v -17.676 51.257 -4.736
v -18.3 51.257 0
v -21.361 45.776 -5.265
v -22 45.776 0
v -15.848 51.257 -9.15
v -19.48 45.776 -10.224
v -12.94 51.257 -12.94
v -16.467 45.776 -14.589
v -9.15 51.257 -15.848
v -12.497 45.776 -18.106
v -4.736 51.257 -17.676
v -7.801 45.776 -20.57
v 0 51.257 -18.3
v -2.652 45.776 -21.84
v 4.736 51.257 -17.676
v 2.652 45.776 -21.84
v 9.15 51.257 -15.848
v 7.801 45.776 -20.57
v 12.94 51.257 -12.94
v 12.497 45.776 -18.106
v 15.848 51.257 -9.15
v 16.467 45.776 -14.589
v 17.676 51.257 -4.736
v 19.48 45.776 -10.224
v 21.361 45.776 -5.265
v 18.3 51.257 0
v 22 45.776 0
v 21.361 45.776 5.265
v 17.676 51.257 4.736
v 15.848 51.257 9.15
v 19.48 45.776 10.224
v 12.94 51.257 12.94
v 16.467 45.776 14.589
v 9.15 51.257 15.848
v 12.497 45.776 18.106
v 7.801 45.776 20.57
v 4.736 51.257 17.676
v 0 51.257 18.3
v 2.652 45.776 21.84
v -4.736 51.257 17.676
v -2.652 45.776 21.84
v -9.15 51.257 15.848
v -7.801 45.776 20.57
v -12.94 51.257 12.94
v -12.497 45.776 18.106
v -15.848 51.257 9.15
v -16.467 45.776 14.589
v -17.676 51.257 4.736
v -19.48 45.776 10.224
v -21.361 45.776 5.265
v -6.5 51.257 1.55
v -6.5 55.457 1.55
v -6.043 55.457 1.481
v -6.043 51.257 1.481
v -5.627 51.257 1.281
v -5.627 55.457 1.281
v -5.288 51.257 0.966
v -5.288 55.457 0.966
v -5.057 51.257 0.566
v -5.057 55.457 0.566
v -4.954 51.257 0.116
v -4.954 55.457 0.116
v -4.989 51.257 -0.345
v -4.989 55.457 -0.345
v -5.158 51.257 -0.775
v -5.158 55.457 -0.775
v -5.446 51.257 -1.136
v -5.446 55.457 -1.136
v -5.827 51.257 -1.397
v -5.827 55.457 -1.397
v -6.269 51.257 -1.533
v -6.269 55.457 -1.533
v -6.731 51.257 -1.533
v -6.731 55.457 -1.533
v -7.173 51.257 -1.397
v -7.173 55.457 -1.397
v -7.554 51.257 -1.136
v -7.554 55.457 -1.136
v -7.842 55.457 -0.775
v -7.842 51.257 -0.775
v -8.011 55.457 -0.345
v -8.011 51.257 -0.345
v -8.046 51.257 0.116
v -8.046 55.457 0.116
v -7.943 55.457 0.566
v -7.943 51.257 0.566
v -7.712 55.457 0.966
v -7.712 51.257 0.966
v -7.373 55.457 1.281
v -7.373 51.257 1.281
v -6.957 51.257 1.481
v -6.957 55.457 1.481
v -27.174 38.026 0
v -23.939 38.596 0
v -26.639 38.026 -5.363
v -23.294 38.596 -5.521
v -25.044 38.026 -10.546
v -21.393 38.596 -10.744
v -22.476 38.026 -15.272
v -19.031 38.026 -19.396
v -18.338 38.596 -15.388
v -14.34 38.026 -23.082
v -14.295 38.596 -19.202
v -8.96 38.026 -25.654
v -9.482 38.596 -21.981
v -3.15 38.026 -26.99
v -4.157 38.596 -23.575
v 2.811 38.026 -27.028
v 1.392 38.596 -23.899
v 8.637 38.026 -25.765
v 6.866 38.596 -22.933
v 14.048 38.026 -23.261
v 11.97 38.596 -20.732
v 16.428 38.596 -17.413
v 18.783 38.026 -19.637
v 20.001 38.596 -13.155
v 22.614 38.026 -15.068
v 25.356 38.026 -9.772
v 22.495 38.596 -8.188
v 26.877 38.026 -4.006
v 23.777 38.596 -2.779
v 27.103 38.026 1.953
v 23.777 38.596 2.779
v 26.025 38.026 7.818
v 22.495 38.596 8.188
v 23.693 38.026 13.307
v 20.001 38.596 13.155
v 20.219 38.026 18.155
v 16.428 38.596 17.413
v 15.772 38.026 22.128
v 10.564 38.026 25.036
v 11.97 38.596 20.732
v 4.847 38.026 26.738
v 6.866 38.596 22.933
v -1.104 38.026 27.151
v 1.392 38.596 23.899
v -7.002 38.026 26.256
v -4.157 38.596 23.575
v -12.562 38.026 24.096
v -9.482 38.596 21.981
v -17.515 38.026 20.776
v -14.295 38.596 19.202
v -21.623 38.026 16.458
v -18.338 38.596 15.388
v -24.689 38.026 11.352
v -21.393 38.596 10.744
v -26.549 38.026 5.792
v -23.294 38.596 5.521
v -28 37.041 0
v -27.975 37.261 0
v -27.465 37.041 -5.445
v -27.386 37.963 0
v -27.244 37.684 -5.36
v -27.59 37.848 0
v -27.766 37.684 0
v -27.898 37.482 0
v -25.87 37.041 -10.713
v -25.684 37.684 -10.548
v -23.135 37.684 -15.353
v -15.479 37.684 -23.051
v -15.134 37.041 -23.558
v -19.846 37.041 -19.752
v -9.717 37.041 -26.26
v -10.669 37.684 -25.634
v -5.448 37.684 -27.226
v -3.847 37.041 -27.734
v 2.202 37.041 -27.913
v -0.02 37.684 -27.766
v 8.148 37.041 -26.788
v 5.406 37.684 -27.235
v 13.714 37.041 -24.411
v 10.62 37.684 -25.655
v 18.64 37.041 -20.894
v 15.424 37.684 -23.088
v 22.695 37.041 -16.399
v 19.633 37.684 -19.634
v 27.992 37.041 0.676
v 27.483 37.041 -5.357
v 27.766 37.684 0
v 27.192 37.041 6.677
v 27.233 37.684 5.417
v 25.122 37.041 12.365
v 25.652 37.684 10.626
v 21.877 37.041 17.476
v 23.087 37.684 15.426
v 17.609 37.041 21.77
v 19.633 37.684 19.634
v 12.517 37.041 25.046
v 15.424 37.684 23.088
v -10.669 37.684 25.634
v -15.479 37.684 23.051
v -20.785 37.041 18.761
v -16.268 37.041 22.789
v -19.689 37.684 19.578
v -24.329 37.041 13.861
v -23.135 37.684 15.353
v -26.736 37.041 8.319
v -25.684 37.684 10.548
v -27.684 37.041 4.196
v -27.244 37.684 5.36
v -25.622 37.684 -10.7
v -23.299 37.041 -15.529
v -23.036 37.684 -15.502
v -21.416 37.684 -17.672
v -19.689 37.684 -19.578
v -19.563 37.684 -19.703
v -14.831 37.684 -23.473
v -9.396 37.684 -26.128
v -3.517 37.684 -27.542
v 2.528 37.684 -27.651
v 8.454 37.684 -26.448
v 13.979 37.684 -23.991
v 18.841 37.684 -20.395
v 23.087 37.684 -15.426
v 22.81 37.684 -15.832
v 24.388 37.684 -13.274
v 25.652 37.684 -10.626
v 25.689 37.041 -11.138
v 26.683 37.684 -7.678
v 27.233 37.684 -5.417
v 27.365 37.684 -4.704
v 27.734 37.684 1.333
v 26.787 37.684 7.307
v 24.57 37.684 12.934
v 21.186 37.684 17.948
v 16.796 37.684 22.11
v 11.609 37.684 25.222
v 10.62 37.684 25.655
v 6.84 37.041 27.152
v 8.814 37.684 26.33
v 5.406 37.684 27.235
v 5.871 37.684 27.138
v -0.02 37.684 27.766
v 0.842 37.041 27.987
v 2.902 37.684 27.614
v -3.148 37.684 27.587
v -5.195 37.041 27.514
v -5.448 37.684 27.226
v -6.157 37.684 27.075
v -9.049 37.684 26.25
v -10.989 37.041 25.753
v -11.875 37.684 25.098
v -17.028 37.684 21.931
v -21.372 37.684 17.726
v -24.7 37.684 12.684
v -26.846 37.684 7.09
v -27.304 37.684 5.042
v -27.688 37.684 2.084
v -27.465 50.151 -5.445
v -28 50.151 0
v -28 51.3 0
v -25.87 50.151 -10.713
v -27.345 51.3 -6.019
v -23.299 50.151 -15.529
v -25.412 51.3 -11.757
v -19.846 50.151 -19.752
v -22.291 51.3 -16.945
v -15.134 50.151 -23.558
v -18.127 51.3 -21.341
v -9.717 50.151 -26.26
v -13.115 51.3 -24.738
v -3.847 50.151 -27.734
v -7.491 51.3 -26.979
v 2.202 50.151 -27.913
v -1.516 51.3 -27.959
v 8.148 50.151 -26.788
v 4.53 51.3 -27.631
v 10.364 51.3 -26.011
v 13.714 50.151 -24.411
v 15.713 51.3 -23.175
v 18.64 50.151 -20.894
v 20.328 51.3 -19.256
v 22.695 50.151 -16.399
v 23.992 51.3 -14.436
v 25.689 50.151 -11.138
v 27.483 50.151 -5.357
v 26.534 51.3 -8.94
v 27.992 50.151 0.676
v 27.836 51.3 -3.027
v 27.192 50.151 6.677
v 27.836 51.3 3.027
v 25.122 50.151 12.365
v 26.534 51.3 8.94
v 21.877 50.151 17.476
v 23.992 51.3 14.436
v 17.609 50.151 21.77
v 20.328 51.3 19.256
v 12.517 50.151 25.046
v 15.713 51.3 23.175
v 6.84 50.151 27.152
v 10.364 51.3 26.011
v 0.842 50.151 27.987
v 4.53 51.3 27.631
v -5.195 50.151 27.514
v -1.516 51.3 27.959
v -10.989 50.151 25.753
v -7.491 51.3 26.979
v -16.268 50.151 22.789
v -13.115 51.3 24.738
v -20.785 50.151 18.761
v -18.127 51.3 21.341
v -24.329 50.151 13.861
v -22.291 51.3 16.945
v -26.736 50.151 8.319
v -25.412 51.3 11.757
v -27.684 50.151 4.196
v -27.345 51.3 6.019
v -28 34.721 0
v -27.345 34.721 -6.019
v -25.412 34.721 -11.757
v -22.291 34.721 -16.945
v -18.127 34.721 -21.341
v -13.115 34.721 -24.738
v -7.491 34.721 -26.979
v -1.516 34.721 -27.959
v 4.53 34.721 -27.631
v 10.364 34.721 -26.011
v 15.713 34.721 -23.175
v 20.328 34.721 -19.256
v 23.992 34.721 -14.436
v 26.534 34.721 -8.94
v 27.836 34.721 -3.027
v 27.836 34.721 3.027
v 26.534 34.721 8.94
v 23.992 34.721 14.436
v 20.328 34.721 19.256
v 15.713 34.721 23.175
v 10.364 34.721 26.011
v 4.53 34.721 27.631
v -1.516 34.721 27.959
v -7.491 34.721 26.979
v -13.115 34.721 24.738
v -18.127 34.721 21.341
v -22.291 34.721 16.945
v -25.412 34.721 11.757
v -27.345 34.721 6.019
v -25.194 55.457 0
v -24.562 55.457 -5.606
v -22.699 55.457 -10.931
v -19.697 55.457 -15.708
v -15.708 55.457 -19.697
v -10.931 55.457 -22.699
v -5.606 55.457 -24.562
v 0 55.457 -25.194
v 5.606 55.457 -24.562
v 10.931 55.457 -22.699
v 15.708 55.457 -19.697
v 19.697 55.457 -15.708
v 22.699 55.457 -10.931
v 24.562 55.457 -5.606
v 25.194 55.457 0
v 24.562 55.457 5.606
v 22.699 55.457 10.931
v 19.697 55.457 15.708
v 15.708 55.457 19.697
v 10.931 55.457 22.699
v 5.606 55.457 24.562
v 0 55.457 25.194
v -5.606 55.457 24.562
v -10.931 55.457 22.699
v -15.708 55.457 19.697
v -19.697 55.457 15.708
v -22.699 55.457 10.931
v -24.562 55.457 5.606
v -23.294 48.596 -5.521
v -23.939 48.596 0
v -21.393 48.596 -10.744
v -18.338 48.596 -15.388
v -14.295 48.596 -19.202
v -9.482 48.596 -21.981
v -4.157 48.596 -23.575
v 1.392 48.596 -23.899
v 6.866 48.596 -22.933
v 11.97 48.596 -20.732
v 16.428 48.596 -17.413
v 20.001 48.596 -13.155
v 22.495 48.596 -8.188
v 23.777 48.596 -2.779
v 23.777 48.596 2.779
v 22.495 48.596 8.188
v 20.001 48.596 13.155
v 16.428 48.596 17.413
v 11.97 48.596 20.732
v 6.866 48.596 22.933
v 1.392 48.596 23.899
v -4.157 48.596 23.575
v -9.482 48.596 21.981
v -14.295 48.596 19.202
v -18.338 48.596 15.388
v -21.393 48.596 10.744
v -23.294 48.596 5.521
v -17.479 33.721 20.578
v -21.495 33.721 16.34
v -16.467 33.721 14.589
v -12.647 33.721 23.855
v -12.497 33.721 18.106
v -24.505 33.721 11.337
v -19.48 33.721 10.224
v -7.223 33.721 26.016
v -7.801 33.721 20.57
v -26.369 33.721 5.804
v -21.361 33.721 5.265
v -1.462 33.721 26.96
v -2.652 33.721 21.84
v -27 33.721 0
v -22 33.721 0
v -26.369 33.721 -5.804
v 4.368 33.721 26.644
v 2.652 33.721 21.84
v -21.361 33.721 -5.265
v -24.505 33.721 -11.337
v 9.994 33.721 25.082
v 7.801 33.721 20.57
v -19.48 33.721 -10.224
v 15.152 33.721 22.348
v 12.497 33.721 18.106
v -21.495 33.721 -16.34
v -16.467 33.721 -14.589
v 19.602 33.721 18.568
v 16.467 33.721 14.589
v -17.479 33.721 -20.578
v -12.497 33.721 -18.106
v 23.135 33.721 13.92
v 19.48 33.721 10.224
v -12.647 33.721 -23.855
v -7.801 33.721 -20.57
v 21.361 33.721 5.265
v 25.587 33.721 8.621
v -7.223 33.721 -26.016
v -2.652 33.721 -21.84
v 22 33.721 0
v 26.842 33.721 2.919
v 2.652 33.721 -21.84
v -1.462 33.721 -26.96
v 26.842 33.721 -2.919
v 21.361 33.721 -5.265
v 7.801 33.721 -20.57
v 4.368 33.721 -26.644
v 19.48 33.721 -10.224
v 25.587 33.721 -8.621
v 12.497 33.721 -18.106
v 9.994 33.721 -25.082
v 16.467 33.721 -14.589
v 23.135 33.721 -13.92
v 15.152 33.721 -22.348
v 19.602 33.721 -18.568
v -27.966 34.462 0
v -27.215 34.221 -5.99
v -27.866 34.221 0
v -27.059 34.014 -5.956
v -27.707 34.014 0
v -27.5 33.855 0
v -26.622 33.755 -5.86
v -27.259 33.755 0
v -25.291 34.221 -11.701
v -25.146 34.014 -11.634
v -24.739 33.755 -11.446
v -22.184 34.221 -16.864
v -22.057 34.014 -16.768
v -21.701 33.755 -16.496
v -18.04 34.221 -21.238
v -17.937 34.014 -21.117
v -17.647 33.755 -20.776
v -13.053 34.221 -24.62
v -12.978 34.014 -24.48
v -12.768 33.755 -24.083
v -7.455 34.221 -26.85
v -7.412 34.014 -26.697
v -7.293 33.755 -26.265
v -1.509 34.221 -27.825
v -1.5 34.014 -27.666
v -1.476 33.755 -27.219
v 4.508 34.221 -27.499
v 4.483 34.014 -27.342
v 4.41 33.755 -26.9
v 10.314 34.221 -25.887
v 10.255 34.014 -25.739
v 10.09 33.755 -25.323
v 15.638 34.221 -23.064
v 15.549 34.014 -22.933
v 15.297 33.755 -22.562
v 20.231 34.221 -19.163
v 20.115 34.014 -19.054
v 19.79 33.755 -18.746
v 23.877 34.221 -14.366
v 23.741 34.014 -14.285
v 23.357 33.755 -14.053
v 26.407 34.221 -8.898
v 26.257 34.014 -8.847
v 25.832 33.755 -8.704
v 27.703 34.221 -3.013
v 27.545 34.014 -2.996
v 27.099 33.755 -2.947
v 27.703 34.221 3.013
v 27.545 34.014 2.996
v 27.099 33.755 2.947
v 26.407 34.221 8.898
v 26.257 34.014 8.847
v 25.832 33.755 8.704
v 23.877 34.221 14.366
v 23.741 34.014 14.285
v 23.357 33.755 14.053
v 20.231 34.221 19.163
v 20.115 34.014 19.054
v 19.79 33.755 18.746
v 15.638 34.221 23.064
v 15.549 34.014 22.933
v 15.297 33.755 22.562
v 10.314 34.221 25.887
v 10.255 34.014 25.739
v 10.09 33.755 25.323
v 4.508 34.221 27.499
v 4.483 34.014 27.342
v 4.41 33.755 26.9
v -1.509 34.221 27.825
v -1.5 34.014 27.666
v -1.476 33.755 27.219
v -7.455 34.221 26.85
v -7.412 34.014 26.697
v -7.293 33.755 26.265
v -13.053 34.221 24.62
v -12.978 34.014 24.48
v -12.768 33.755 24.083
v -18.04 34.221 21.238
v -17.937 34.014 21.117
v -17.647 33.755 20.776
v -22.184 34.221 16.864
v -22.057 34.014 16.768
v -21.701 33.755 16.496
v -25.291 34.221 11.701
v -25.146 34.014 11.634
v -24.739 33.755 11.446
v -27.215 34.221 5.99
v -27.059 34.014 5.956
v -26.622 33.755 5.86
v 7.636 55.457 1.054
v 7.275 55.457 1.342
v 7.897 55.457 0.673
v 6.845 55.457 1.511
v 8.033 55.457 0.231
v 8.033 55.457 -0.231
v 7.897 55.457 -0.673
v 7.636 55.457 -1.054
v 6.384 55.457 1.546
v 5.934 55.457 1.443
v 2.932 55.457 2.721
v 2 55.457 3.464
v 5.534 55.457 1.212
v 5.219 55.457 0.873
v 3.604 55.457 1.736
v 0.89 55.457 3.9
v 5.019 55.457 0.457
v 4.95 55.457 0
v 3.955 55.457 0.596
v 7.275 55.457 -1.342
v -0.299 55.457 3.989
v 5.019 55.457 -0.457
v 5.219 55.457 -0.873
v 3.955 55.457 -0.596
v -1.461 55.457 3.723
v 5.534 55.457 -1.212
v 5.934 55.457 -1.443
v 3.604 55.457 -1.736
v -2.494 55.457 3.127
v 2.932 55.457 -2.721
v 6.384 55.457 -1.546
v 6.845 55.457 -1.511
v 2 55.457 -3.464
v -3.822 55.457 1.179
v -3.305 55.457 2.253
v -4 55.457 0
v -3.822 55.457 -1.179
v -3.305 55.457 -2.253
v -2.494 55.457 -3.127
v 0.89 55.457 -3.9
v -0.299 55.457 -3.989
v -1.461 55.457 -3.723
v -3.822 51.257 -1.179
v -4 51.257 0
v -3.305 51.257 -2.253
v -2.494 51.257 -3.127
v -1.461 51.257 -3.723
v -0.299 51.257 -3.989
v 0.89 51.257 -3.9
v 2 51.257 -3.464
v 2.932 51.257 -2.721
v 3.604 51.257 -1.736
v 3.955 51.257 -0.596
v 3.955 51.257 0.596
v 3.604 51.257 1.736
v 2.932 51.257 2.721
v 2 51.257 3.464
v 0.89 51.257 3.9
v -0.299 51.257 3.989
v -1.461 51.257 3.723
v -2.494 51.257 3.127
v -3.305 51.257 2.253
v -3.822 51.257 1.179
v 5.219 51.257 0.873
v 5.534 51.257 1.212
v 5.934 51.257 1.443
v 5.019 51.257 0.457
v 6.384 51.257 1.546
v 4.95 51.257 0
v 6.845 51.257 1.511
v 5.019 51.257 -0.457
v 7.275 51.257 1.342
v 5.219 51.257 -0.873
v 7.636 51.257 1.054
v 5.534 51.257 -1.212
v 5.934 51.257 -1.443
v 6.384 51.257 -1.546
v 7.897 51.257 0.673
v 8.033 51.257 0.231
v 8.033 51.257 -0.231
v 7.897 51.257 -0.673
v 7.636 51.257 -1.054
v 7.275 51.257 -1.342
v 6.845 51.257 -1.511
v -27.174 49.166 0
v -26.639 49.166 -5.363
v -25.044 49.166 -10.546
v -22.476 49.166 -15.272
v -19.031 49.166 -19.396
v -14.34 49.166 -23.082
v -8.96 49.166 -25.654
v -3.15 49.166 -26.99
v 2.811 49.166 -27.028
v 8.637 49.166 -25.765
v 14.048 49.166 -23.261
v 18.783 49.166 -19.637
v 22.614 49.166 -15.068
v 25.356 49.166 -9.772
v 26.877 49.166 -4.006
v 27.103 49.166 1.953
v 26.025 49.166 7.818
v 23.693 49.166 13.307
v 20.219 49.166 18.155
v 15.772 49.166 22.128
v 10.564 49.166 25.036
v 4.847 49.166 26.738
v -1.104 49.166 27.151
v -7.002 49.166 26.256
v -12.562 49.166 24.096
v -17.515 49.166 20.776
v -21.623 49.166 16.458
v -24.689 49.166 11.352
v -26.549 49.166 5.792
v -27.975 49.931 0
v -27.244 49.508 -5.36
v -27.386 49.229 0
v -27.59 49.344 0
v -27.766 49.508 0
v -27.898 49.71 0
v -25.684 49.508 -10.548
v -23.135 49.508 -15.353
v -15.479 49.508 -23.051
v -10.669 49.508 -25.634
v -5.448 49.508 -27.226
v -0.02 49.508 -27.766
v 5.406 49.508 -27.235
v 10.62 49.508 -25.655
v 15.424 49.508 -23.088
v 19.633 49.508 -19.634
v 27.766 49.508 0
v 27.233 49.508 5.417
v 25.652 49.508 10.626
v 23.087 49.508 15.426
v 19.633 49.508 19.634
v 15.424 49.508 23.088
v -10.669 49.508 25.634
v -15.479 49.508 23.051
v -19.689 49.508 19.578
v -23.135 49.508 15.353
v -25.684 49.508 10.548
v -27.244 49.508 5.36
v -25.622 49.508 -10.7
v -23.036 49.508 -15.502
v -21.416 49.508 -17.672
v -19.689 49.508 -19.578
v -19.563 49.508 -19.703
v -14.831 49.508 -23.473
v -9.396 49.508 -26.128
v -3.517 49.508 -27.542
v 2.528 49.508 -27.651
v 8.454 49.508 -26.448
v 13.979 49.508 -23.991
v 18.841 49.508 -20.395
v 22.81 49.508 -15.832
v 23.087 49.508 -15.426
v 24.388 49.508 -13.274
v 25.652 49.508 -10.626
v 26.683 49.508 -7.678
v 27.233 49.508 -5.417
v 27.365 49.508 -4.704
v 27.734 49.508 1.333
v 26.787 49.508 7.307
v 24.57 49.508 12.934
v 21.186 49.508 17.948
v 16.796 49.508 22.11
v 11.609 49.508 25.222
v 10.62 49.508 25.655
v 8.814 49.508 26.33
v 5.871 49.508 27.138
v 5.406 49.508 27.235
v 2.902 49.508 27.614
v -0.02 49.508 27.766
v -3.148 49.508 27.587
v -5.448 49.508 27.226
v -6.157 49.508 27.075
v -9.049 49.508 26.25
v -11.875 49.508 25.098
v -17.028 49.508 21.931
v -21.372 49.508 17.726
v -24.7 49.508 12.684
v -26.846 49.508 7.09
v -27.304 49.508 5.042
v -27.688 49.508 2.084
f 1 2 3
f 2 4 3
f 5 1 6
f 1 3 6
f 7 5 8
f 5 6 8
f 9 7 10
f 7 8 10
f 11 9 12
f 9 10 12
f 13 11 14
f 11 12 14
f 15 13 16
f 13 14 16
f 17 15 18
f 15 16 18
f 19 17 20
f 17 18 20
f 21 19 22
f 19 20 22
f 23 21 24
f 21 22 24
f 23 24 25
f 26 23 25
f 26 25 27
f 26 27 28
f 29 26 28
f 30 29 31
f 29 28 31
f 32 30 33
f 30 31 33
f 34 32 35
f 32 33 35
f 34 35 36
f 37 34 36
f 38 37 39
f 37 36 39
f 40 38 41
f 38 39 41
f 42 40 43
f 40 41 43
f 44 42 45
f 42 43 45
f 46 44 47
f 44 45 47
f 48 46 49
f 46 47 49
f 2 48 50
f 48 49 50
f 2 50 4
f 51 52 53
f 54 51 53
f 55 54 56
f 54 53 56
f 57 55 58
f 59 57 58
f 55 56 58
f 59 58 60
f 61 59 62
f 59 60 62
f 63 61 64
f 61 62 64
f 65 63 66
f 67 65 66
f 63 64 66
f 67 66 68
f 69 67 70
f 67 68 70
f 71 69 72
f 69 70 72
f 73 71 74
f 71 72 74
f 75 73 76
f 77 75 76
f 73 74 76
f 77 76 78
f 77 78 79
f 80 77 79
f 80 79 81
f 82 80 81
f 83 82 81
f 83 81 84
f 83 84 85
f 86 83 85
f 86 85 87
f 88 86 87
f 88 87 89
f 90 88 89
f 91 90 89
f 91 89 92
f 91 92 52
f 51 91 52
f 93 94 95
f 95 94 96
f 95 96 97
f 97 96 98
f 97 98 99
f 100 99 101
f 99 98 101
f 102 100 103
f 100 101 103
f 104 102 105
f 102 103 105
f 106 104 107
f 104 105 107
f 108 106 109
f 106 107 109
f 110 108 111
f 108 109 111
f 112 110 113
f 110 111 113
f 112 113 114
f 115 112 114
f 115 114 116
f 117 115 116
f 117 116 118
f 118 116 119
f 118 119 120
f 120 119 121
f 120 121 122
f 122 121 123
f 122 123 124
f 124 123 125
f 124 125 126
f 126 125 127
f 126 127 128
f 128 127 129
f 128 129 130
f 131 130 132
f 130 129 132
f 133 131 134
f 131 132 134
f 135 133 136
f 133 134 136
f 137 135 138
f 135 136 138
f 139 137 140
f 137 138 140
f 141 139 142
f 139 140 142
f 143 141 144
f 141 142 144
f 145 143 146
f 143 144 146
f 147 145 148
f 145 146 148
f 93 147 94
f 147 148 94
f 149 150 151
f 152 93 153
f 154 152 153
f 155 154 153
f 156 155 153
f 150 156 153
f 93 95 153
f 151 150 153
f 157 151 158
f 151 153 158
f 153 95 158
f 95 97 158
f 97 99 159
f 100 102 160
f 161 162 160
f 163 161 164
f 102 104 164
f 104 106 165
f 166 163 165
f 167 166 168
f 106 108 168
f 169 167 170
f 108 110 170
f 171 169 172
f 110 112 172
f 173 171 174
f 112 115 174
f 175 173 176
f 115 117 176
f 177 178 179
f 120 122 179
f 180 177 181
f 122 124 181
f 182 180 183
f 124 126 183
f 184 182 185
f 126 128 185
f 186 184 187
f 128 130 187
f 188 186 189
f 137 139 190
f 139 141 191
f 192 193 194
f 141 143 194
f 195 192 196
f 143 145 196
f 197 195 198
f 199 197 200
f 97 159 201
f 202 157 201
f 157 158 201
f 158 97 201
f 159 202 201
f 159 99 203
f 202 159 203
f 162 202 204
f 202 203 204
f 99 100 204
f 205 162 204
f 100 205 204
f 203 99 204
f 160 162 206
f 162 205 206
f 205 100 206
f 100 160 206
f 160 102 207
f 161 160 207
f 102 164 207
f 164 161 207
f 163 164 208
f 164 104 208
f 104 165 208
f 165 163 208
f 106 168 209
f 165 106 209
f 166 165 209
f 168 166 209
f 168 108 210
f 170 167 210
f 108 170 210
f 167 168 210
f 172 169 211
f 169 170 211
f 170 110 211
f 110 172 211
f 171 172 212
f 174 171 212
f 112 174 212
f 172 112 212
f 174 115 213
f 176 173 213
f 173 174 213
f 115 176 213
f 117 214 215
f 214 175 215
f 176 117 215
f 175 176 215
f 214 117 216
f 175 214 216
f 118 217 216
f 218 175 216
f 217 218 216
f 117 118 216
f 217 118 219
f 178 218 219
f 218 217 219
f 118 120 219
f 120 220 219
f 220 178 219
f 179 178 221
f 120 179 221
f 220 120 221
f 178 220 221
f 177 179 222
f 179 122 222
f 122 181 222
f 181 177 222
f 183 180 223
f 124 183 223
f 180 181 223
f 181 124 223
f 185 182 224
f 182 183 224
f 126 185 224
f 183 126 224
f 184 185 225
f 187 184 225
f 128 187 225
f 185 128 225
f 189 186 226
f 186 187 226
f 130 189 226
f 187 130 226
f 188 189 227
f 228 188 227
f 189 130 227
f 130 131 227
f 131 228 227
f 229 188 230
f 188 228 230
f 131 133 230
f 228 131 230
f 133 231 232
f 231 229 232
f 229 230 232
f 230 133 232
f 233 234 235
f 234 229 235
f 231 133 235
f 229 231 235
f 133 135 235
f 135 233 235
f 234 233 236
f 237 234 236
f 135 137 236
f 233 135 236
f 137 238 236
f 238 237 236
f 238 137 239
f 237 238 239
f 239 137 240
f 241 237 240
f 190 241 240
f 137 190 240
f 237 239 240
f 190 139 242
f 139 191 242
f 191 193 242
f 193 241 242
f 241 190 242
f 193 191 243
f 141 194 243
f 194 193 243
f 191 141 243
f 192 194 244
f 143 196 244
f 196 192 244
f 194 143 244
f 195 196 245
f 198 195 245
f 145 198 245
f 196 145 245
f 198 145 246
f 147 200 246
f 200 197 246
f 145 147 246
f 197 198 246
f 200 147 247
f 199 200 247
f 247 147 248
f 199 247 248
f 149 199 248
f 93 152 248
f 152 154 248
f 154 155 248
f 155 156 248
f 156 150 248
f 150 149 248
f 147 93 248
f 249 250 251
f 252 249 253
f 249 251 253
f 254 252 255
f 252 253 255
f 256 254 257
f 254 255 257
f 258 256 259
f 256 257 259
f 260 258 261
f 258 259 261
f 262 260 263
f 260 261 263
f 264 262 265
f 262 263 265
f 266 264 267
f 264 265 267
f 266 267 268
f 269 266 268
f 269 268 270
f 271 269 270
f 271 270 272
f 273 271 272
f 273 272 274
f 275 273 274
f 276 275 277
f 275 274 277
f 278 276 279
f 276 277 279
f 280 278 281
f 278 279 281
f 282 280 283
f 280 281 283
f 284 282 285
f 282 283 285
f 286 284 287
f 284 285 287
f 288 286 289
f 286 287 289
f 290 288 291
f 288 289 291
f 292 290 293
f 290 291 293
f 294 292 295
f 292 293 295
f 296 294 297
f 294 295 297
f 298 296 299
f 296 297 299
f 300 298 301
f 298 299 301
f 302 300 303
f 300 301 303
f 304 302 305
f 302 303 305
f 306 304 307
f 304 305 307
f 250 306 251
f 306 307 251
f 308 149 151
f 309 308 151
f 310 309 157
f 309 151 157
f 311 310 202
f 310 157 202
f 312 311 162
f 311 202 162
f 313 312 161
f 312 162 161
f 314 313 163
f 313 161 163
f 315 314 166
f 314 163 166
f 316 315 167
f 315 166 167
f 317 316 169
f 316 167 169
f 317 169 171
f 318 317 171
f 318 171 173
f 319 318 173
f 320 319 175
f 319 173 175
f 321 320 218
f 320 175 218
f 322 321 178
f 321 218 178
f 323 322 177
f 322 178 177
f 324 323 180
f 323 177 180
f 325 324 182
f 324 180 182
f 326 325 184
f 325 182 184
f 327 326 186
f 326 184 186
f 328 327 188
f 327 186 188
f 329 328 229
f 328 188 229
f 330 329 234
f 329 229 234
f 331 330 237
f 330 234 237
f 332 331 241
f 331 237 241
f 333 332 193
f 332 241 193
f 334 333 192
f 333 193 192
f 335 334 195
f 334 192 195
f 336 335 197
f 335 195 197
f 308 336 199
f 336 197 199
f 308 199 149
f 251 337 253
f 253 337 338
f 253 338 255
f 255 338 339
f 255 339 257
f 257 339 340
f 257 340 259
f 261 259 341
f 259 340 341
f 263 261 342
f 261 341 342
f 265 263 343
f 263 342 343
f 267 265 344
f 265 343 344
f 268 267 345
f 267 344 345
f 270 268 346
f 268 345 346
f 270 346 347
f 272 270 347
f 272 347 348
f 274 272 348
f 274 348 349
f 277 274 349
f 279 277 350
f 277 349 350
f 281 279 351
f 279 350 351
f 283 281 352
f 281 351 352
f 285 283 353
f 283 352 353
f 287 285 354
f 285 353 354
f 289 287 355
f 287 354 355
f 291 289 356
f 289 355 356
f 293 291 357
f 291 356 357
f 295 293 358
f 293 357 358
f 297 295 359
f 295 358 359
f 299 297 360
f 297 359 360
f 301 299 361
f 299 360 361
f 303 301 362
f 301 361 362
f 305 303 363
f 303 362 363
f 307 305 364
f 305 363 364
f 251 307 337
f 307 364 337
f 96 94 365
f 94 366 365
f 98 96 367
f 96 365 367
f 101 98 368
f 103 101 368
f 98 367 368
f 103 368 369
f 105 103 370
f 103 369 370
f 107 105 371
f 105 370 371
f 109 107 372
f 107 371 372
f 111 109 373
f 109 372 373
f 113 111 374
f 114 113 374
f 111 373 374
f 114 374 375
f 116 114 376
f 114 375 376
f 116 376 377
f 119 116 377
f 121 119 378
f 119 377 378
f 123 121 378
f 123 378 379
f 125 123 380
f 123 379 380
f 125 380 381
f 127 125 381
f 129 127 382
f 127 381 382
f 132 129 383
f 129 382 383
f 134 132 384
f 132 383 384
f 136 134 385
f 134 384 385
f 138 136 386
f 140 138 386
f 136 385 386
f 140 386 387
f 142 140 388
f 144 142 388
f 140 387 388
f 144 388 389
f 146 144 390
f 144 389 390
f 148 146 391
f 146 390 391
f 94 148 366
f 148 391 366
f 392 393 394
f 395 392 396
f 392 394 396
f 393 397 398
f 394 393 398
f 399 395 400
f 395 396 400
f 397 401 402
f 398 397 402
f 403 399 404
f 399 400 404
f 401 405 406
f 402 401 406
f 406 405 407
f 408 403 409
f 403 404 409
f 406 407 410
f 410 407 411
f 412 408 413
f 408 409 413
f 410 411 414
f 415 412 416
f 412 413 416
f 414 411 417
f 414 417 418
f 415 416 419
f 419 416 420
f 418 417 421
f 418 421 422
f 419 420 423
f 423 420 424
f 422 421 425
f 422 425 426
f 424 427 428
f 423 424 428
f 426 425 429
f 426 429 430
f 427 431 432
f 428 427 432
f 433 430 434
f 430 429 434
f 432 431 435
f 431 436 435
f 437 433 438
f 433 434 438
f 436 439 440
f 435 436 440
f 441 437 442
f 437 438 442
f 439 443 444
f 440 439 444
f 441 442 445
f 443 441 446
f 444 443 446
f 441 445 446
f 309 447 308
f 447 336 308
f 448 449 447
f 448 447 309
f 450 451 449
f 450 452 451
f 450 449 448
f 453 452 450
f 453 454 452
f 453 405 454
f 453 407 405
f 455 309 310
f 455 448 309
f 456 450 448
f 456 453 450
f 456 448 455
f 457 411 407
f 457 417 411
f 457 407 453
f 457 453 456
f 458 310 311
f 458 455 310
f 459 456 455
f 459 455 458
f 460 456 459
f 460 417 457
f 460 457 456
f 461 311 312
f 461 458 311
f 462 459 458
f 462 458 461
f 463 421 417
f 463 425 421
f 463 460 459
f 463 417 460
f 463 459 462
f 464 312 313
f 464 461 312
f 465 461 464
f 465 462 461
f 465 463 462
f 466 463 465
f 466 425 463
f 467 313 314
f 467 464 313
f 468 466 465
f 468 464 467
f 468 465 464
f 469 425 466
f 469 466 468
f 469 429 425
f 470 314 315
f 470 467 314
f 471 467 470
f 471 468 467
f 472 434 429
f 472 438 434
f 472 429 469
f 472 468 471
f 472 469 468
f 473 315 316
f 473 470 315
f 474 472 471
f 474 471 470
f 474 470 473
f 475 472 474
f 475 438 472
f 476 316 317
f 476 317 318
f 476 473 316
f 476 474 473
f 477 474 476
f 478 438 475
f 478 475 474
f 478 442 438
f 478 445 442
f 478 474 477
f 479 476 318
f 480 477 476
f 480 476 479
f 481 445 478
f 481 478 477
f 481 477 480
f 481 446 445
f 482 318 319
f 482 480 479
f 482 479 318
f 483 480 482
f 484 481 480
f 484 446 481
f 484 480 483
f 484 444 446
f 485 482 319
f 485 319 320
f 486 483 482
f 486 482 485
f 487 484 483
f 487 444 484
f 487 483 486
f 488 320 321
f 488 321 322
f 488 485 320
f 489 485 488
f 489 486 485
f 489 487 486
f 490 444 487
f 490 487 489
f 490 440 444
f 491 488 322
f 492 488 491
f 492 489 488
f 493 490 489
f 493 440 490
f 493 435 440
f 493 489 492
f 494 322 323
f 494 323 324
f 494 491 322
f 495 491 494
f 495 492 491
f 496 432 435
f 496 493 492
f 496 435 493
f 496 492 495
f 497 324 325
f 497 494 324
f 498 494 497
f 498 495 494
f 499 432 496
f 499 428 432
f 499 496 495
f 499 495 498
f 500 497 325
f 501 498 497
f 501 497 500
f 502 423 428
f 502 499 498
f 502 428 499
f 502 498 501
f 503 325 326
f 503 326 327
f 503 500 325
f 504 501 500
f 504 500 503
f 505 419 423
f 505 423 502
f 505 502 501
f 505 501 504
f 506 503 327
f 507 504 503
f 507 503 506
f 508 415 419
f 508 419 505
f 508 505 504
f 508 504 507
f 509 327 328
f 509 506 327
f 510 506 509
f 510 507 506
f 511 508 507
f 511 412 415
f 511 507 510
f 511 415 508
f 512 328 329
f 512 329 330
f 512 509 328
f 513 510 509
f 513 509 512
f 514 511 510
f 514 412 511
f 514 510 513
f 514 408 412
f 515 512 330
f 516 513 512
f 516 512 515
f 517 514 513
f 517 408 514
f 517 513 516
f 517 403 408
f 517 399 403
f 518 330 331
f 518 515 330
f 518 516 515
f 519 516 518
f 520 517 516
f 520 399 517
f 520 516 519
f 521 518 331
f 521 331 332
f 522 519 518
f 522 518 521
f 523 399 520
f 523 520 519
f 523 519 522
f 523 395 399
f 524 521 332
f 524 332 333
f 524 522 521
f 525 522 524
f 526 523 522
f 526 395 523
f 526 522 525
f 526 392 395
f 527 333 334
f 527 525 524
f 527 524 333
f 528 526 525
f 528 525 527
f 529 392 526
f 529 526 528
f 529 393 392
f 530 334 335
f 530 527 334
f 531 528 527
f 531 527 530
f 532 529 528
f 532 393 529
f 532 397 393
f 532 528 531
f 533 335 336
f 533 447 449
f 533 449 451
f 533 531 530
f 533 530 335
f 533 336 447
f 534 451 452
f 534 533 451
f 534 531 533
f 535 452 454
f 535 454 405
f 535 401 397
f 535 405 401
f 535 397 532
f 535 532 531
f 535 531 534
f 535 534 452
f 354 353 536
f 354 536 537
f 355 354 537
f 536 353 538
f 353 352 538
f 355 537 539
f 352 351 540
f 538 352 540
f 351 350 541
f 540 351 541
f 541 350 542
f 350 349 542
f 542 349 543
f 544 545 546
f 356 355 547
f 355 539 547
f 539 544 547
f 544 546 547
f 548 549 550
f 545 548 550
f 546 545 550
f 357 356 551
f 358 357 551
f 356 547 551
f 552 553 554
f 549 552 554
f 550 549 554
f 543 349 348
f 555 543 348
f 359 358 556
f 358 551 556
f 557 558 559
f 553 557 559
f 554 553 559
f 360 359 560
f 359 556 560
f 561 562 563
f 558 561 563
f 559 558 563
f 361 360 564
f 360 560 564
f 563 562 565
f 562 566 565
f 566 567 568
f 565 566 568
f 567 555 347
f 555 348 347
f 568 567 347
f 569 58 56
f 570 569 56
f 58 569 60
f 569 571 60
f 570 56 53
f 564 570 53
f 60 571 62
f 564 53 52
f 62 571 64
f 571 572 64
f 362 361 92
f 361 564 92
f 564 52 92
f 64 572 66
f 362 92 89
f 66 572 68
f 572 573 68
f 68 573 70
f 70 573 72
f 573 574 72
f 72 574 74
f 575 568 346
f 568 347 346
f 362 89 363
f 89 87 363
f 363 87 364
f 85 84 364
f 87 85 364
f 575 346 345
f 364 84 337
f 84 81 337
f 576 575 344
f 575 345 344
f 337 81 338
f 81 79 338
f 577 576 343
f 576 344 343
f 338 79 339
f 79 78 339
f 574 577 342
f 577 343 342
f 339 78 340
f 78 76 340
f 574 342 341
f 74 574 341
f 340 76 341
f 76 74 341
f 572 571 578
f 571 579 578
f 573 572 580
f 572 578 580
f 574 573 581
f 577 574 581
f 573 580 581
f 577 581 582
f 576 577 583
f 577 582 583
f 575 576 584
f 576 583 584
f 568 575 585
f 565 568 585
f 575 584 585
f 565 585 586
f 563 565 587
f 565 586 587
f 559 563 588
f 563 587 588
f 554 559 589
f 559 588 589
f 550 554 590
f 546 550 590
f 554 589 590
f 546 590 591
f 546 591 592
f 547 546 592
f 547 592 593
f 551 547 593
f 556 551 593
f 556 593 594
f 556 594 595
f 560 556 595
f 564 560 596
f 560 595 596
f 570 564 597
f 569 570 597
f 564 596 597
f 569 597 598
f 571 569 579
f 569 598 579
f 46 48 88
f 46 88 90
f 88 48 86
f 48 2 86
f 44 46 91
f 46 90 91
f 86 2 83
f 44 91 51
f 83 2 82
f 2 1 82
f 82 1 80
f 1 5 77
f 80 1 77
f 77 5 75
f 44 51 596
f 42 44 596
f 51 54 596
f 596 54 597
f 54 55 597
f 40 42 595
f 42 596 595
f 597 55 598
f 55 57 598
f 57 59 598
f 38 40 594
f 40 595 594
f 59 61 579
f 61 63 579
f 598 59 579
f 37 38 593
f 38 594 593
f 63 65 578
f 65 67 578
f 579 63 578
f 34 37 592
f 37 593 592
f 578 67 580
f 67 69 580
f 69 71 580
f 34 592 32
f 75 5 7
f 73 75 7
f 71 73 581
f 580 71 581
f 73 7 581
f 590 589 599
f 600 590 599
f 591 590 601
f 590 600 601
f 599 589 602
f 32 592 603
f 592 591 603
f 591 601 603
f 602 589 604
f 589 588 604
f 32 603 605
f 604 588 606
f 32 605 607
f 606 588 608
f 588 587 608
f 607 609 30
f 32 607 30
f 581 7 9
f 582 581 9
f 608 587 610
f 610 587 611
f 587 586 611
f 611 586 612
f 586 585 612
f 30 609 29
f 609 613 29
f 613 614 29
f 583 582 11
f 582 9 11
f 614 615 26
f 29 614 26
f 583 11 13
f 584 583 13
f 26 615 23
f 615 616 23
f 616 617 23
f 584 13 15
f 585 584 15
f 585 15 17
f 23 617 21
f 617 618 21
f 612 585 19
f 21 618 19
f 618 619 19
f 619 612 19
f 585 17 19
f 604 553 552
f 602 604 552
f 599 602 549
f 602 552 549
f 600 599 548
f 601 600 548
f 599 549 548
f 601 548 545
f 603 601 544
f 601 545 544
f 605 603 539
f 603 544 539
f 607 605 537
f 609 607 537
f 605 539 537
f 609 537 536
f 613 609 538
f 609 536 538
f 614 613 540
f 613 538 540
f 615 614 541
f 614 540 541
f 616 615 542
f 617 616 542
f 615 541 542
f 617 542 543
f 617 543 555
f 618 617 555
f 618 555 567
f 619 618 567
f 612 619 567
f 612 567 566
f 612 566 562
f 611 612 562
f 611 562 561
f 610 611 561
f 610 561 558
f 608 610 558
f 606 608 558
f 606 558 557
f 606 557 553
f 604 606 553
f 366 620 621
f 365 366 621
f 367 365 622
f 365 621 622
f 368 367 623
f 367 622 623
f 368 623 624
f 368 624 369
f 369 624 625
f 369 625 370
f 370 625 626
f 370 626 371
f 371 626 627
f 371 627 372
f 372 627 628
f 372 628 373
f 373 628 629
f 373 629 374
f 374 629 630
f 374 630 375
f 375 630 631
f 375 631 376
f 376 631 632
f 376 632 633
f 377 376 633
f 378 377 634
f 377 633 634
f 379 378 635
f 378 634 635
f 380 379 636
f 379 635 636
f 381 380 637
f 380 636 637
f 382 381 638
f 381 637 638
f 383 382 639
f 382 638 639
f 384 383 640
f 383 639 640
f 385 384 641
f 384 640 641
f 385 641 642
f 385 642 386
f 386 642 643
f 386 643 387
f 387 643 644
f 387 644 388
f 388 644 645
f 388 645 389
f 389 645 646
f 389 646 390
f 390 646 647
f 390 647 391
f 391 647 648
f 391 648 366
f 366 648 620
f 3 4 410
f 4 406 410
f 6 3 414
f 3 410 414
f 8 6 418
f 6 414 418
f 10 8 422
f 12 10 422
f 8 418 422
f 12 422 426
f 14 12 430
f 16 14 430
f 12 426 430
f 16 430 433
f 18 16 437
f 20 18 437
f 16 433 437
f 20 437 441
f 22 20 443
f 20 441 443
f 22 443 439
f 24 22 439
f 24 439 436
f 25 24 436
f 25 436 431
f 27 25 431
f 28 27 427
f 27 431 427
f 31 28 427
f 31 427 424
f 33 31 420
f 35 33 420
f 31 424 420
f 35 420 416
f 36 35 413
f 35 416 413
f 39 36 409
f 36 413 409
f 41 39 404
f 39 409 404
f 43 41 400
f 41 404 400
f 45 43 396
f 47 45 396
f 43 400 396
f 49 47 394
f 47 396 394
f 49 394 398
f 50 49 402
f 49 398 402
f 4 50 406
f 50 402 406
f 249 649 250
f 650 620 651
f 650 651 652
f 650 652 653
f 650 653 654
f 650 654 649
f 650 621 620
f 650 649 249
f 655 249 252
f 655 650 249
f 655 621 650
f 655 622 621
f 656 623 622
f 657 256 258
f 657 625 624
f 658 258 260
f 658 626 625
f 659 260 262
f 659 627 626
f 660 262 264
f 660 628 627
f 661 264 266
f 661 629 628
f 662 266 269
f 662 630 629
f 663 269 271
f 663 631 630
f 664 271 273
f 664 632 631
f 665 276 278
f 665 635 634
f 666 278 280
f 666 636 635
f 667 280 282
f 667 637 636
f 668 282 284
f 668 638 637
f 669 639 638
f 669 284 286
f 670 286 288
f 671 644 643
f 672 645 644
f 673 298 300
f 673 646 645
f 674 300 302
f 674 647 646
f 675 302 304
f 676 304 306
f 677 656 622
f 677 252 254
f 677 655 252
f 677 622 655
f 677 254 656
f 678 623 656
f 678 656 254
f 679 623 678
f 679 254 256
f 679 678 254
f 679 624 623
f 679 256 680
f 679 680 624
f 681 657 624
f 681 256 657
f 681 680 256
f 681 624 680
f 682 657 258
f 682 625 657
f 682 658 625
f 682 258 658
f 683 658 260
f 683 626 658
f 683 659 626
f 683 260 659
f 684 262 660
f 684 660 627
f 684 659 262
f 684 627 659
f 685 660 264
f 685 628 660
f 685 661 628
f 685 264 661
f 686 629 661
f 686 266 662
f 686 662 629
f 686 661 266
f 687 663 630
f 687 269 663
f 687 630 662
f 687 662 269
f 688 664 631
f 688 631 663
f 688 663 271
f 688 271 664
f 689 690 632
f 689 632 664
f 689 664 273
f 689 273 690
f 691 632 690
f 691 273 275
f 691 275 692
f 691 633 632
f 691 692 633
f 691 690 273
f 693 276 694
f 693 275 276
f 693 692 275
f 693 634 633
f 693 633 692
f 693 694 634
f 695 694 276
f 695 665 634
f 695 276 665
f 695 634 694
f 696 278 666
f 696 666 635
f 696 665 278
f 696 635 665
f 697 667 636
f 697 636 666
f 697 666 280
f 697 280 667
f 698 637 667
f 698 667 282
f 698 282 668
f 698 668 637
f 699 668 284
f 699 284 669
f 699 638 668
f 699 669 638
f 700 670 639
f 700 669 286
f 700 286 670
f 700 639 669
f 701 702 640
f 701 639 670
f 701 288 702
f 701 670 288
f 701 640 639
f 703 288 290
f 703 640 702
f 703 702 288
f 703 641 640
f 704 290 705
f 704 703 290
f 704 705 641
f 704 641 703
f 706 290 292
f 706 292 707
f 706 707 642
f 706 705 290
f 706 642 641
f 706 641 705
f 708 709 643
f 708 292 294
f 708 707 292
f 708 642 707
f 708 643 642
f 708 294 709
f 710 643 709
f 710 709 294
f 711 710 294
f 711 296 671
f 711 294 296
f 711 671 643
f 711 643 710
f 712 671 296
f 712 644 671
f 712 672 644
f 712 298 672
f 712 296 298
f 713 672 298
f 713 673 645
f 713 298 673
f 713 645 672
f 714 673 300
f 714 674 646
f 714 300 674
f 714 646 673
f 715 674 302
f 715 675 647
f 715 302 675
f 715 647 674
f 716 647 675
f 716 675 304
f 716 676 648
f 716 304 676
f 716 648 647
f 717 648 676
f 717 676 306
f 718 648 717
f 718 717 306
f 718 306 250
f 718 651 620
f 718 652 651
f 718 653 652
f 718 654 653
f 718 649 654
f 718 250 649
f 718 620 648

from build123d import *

# Parameters (mm, degrees)
SKETCH_3_R          = 1.55
CUT_EXTRUDE_1_DEPTH = 10
FILLET_1_R          = 1
FILLET_2_R          = 1
FILLET_3_R          = 1


with BuildPart() as part:
    # 草图1 → 旋转1 (revolve)
    with BuildSketch(Plane.XY, mode=Mode.PRIVATE) as revolve_1_sk:
        Polygon((28, 36.720931937), (28, 37.879871974), (23.939022146, 38.595931937), (23.939022146, 48.595931937), (28, 49.311991901), (28, 51.299673955), (25.1937626, 55.456960988), (4, 55.456960988), (4, 51.256921373), (18.3, 51.256921373), (22, 45.775573993), (22, 36.720931937), (22, 33.720931937), (28, 33.720931937), align=None)
    revolve(revolve_1_sk.sketch.rotate(Axis((0, 76.906520748, 0), (0, -1, 0)), 180), axis=Axis((0, 76.906520748, 0), (0, -1, 0)))

    # 草图3 → 切除-拉伸1 (cut)
    with BuildSketch(Plane(origin=(0, 55.456960988, 0), x_dir=(1, 0, 0), z_dir=(0, 1, 0))):
        with Locations(Location((-6.5, 0, 0), (0, 0, 270))):
            Circle(SKETCH_3_R)
        with Locations(Location((6.5, 0, 0), (0, 0, 180))):
            Circle(SKETCH_3_R)
    extrude(amount=-CUT_EXTRUDE_1_DEPTH, mode=Mode.SUBTRACT)

    # 圆角1
    fillet_1_edges = [part.edges().sort_by_distance(p)[0] for p in [
        (28, 49.311991901, 0),
    ]]
    fillet(fillet_1_edges, radius=FILLET_1_R)

    # 圆角2
    fillet_2_edges = [part.edges().sort_by_distance(p)[0] for p in [
        (28, 37.879871974, 0),
    ]]
    fillet(fillet_2_edges, radius=FILLET_2_R)

    # 圆角3
    fillet_3_edges = [part.edges().sort_by_distance(p)[0] for p in [
        (28, 33.720931937, 0),
    ]]
    fillet(fillet_3_edges, radius=FILLET_3_R)


solid = part.part
